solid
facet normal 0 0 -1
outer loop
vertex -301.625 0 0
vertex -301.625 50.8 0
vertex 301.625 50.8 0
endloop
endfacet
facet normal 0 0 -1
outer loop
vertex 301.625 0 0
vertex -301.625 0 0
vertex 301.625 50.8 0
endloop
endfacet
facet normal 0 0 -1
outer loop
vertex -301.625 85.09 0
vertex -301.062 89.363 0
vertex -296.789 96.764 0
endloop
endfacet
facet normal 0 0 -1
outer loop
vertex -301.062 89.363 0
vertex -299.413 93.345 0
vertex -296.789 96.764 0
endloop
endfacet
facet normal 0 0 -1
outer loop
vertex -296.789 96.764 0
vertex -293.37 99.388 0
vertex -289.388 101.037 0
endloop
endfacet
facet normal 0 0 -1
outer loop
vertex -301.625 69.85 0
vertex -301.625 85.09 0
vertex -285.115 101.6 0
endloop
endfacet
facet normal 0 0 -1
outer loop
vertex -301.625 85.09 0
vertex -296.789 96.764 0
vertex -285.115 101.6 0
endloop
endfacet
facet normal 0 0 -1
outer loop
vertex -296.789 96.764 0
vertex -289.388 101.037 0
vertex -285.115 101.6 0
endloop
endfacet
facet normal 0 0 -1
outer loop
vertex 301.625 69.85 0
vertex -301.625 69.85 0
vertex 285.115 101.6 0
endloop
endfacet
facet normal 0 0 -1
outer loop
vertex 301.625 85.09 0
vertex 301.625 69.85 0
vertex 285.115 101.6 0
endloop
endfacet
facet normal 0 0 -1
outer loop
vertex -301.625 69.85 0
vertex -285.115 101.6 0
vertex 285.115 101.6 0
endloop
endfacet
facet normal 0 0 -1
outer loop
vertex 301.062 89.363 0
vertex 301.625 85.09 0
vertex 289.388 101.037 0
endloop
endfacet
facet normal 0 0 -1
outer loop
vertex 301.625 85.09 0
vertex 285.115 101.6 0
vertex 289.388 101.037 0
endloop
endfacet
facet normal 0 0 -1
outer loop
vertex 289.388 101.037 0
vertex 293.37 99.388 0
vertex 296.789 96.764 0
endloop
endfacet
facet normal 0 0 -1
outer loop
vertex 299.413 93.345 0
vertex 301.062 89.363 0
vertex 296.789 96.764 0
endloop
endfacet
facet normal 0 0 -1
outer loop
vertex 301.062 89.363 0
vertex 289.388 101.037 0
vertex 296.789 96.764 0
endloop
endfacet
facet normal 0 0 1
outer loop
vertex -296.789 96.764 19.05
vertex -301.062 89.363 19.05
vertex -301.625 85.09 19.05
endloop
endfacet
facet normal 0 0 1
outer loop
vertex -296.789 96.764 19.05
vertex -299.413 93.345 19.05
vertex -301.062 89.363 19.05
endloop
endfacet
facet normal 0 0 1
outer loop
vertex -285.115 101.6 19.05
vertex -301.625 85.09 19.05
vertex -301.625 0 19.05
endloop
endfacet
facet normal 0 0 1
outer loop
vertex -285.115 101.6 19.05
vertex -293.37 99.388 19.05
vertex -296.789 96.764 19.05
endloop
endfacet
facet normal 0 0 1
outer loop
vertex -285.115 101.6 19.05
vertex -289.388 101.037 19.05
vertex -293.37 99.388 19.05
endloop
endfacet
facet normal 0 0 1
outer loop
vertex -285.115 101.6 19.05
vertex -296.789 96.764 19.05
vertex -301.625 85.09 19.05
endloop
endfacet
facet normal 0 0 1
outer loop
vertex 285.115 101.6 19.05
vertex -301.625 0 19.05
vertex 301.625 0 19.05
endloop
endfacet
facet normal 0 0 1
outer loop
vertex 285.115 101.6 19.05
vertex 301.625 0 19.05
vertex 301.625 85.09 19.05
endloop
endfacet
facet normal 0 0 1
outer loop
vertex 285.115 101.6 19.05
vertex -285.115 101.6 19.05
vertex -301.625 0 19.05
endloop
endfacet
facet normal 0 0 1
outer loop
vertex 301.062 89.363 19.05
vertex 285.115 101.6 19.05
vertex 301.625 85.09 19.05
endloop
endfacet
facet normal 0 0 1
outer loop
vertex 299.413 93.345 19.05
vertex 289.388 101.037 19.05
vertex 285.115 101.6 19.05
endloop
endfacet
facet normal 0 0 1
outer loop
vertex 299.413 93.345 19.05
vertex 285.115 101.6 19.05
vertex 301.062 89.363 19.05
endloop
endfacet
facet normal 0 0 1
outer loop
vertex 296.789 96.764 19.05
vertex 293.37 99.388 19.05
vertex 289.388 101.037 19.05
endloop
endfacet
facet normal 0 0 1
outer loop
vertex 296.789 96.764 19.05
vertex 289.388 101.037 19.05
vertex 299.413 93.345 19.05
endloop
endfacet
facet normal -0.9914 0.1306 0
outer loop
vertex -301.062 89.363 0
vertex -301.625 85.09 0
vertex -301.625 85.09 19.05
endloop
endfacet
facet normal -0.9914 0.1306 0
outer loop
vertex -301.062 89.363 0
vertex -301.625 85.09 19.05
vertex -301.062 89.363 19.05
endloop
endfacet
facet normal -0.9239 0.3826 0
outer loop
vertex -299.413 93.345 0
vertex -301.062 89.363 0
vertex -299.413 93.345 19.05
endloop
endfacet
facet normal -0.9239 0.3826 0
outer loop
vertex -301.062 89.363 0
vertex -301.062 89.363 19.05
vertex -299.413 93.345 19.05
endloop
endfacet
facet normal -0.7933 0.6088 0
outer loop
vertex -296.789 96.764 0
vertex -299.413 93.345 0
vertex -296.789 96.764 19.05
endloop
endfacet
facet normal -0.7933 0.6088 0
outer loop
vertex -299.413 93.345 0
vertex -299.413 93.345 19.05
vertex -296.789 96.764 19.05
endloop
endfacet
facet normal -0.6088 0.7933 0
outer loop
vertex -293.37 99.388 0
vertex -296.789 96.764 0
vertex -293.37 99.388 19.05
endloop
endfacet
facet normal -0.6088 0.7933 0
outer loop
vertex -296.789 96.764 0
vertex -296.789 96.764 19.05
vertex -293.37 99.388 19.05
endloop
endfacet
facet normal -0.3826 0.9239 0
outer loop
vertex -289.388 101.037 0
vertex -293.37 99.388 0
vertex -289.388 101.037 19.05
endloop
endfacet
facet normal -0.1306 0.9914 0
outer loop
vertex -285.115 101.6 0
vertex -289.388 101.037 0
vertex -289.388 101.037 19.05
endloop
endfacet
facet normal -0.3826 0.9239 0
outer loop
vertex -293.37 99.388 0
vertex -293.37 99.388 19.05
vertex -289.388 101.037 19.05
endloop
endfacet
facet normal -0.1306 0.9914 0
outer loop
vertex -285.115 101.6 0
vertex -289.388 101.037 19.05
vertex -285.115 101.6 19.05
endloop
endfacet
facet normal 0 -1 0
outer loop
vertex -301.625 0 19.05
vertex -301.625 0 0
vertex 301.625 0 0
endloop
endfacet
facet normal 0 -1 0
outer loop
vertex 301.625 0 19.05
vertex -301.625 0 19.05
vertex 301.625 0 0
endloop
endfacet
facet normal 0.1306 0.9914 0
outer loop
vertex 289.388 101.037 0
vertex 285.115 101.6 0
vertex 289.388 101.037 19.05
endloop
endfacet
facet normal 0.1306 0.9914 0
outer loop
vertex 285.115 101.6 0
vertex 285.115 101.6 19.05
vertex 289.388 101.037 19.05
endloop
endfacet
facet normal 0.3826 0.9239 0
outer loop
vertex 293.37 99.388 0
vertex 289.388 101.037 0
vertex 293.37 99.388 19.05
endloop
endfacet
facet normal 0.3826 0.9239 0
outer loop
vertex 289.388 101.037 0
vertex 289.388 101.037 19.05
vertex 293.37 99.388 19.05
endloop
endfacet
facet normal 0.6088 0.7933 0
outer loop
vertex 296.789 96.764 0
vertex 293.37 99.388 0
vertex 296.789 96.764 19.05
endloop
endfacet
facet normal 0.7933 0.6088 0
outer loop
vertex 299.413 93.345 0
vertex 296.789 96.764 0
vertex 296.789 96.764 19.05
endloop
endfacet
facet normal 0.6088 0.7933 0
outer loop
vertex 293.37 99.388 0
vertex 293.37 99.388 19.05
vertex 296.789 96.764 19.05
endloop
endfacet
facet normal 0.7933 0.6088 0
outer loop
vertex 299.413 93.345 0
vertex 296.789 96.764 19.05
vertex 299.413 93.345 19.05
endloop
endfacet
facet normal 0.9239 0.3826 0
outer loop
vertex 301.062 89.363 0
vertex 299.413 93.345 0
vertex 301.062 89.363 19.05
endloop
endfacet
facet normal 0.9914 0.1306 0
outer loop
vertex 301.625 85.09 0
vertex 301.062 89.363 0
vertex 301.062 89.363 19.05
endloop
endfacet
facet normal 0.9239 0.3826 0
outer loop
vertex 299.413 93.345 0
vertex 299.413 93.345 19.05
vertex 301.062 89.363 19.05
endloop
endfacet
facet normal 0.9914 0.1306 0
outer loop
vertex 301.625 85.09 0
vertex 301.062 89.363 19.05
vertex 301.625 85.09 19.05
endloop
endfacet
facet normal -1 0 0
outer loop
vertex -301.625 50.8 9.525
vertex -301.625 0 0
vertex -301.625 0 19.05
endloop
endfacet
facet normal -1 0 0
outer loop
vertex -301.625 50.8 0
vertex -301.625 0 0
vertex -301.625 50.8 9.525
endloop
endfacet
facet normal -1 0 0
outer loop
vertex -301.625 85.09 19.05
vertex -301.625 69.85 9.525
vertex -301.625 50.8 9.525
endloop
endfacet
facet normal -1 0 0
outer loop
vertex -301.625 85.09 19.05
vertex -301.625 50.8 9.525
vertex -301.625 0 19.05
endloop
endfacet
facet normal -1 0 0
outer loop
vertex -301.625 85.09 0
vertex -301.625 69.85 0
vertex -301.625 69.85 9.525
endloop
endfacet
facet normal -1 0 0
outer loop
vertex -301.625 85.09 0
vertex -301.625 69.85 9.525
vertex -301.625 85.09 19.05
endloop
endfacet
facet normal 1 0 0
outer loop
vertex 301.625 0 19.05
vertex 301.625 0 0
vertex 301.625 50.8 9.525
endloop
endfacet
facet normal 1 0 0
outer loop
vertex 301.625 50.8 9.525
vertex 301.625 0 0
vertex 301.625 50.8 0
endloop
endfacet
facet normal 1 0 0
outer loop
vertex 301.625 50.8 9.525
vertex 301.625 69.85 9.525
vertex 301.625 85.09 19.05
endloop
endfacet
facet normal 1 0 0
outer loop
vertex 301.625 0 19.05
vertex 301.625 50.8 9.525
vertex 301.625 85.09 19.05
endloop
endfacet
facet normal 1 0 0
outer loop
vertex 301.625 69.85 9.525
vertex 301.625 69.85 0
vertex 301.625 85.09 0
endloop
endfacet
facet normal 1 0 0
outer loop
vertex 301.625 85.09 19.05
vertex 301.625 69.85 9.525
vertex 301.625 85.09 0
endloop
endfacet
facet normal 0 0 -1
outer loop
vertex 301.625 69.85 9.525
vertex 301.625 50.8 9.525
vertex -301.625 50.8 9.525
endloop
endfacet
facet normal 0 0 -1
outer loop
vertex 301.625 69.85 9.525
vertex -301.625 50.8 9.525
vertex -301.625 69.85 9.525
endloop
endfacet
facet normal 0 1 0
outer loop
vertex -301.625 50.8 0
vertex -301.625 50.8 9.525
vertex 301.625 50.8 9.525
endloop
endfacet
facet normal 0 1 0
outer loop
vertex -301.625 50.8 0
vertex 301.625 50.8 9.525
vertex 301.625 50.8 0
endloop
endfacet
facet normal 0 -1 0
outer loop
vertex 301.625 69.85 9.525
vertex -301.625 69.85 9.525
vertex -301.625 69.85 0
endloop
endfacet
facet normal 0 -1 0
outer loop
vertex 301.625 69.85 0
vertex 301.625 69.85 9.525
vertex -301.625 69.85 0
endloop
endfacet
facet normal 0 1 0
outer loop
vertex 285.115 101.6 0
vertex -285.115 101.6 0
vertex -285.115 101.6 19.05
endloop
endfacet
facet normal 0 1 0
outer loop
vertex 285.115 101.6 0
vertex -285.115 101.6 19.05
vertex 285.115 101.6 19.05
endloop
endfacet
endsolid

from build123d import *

# Parameters (mm, degrees)
SKETCH1_W           = 603.25
SKETCH1_H           = 101.6
BOSS_EXTRUDE1_DEPTH = 19.05
SKETCH2_W           = 9.525
SKETCH2_H           = 19.05
CUT_EXTRUDE1_DEPTH  = 613.042502609
FILLET1_R           = 16.51


with BuildPart() as part:
    # Sketch1 → Boss-Extrude1 (new body)
    with BuildSketch(Plane.XY):
        with Locations((0, 50.8)):
            Rectangle(SKETCH1_W, SKETCH1_H)
    extrude(amount=BOSS_EXTRUDE1_DEPTH)

    # Sketch2 → Cut-Extrude1 (cut, through all)
    with BuildSketch(Plane(origin=(301.625, 0, 0), x_dir=(0, 0, -1), z_dir=(1, 0, 0))):
        with Locations((-4.7625, 60.325)):
            Rectangle(SKETCH2_W, SKETCH2_H)
    extrude(amount=-CUT_EXTRUDE1_DEPTH, mode=Mode.SUBTRACT)

    # Fillet1
    fillet1_edges = [part.edges().sort_by_distance(p)[0] for p in [
        (301.625, 101.6, 9.525),
        (-301.625, 101.6, 9.525),
    ]]
    fillet(fillet1_edges, radius=FILLET1_R)


solid = part.part
